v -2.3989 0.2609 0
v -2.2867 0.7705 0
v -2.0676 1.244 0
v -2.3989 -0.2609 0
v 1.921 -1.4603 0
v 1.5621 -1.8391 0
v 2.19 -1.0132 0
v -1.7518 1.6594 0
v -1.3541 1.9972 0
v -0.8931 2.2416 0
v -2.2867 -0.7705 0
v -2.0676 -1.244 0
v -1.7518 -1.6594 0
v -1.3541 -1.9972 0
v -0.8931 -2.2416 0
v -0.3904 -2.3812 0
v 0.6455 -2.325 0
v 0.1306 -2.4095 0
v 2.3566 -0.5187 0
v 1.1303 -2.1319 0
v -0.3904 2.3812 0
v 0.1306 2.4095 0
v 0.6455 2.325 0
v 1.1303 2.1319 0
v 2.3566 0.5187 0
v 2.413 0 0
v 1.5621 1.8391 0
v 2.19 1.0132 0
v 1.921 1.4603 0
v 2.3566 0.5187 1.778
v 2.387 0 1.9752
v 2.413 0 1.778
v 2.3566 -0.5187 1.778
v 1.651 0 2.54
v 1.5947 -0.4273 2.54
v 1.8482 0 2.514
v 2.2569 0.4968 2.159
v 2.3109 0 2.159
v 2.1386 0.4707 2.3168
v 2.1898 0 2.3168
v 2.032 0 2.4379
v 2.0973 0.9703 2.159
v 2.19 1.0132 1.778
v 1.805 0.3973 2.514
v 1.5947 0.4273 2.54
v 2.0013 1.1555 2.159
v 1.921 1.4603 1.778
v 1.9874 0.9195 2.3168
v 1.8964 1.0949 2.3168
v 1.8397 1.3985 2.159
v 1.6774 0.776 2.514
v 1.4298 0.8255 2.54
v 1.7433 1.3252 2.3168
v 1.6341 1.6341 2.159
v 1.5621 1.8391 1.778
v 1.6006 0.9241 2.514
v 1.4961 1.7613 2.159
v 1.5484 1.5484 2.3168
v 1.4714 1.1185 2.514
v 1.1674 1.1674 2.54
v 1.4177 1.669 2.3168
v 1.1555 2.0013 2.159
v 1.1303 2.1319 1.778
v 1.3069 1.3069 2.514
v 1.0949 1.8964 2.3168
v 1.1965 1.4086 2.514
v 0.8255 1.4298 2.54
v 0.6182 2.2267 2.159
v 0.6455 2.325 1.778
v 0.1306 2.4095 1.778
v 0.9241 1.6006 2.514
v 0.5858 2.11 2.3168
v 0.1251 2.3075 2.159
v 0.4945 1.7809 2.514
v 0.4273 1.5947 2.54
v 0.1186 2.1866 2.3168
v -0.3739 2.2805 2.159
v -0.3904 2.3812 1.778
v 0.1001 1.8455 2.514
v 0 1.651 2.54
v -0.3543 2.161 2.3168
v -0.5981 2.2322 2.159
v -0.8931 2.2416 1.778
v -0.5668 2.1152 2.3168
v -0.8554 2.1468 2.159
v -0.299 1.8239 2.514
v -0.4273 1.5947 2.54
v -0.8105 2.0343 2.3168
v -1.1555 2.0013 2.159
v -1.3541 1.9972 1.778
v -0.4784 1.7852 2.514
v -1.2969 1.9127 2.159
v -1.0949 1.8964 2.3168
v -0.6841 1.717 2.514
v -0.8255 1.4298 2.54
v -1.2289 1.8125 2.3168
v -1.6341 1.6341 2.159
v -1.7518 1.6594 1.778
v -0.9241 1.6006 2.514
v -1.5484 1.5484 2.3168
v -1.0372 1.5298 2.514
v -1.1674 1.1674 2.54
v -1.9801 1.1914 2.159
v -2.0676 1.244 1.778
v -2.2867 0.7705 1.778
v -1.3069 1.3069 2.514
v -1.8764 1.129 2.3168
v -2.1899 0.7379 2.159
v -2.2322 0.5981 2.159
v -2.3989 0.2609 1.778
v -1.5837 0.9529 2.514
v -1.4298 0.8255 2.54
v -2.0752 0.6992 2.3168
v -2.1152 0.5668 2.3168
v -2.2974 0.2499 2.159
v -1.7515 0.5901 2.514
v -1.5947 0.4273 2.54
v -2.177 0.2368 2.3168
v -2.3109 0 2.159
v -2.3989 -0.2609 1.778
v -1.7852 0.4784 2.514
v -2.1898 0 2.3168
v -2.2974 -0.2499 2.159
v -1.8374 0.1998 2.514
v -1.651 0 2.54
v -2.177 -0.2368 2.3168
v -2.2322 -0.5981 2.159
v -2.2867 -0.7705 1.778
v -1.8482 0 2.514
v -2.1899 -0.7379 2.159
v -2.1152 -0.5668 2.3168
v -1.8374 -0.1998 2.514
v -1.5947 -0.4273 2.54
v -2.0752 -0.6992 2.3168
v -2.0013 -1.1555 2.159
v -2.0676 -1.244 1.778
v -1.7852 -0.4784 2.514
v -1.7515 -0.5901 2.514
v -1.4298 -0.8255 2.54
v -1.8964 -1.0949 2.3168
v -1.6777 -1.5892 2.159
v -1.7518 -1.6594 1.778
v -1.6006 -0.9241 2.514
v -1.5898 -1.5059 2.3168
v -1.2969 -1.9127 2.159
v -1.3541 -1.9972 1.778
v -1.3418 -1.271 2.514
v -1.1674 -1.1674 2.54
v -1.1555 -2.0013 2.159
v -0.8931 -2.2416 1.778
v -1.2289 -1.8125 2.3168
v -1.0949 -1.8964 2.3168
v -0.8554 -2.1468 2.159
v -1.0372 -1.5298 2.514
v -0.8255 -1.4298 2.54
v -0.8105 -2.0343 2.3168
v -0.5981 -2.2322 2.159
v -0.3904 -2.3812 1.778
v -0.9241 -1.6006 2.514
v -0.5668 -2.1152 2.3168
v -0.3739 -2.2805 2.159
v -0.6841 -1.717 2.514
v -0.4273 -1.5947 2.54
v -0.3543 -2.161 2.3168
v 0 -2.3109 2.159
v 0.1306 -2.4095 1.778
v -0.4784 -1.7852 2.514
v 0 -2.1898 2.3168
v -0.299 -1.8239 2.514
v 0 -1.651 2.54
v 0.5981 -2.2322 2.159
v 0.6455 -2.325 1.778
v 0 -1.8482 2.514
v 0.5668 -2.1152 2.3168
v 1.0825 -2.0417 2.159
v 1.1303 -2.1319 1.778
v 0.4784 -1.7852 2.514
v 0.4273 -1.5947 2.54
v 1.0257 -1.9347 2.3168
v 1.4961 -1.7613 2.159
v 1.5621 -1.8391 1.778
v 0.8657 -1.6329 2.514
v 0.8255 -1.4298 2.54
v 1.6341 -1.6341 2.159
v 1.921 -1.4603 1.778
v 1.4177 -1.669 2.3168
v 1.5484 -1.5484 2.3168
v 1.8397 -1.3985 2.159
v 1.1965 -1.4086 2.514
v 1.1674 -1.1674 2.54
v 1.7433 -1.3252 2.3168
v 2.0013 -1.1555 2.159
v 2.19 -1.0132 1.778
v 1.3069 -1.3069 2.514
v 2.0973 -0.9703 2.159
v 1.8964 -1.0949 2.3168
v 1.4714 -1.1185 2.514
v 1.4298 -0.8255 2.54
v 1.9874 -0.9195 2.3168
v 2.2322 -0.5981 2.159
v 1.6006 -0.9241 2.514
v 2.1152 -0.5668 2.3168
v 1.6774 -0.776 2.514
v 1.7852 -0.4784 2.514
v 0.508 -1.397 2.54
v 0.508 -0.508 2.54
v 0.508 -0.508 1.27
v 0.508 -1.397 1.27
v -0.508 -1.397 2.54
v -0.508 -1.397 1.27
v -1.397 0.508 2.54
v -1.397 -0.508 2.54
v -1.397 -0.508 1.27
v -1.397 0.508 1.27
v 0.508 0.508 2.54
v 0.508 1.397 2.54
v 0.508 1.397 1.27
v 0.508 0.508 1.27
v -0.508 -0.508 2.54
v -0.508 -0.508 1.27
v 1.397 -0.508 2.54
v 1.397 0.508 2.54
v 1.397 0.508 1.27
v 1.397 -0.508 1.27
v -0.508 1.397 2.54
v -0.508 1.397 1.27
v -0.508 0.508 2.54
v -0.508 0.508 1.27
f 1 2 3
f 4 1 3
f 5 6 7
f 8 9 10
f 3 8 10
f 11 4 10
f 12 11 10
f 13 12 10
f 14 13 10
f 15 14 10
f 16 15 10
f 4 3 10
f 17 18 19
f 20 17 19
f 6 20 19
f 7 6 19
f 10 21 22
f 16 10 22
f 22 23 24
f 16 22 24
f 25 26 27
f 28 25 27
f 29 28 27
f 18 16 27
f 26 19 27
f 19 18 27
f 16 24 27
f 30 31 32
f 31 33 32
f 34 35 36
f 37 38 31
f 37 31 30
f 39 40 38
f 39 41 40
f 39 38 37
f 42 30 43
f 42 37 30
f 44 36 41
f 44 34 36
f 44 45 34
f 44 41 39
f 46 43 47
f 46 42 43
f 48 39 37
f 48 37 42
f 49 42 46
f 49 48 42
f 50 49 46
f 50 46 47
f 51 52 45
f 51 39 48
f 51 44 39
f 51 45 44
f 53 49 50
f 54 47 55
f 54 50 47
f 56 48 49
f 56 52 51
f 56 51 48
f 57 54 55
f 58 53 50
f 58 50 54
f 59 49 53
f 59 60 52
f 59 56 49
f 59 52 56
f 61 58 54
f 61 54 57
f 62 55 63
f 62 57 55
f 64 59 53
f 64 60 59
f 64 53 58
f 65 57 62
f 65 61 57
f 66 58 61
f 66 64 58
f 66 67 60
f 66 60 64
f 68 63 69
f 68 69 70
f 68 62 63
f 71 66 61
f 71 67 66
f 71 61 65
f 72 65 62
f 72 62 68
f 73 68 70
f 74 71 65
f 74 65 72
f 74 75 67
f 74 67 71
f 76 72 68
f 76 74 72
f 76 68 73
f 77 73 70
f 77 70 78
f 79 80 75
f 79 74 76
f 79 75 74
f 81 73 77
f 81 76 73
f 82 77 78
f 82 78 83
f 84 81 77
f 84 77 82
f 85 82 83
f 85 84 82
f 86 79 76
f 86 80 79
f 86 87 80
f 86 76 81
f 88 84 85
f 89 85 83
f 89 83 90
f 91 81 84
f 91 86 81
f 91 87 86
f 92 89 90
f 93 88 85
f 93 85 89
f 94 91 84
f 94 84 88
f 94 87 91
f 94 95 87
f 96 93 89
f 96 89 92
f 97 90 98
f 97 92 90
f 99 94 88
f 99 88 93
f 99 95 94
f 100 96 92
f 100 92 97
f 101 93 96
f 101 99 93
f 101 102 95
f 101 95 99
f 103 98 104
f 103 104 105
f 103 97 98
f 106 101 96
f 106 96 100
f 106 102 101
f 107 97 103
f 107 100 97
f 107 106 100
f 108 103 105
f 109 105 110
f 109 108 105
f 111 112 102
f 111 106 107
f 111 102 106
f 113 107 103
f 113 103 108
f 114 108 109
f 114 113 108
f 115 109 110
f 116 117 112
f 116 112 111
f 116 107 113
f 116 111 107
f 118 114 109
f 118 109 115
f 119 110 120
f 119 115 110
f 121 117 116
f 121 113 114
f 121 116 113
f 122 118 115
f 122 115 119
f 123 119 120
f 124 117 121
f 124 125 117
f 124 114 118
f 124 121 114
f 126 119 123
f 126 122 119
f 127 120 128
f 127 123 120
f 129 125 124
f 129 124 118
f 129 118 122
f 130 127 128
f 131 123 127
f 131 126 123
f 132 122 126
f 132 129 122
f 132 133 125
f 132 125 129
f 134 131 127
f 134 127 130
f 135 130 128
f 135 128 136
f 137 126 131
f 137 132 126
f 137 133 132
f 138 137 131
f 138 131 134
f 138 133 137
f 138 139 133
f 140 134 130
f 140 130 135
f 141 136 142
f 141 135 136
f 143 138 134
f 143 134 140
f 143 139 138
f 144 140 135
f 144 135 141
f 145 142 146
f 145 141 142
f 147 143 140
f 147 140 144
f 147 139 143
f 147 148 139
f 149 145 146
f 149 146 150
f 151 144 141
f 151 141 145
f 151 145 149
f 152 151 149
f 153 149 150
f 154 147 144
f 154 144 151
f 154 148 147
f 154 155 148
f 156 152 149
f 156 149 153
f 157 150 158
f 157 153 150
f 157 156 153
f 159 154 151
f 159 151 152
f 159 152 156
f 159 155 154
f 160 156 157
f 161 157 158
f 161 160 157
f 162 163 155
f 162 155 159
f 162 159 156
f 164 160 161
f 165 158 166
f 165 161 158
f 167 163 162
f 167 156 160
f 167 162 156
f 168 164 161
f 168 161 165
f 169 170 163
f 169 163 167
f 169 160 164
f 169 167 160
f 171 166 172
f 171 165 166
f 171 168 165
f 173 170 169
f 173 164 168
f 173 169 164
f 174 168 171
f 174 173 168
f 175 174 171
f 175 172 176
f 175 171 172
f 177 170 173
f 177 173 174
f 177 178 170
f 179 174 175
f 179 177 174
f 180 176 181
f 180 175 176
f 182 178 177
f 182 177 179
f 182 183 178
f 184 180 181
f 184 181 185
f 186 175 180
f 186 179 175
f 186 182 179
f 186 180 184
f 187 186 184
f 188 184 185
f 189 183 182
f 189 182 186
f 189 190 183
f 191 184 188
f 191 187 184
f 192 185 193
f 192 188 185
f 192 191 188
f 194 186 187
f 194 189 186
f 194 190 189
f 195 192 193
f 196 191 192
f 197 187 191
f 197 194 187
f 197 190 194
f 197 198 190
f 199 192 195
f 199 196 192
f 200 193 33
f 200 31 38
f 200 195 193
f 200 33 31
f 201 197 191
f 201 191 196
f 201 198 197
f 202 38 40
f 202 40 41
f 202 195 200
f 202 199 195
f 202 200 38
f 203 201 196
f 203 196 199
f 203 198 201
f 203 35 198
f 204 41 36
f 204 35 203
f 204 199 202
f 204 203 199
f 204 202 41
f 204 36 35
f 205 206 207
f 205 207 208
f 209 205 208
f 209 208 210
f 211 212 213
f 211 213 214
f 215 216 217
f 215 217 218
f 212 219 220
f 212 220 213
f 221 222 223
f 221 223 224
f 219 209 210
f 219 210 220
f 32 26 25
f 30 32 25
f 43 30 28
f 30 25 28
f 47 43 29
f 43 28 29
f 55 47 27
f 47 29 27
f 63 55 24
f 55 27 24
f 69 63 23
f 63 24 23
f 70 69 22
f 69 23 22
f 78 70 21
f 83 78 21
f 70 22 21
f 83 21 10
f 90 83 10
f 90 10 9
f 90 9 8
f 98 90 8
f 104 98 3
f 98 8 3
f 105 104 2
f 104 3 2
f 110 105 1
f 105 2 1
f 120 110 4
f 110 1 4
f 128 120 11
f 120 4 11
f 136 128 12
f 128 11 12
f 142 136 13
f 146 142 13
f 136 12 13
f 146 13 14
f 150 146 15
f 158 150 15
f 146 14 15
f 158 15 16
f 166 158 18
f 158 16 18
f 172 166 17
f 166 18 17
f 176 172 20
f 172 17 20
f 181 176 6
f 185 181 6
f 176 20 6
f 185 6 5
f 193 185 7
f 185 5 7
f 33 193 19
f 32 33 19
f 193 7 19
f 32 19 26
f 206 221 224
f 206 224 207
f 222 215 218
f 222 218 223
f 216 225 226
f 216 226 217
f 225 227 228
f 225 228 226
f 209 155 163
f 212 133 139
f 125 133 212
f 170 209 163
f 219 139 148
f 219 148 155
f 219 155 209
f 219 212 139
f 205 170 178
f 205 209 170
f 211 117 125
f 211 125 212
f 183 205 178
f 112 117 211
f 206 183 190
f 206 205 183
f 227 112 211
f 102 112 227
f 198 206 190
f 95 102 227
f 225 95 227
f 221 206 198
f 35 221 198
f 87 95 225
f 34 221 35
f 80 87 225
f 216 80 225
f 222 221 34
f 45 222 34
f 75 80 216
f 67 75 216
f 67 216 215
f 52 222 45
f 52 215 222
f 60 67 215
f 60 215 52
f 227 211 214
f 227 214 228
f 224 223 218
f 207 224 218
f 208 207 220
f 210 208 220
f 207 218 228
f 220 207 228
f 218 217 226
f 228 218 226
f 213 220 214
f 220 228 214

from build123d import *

# Parameters (mm, degrees)
SKETCH1_R           = 2.413
BOSS_EXTRUDE1_DEPTH = 2.54
CUT_EXTRUDE1_DEPTH  = 1.27
FILLET1_R           = 0.762


with BuildPart() as part:
    # Sketch1 → Boss-Extrude1 (new body)
    with BuildSketch(Plane.XY):
        Circle(SKETCH1_R)
    extrude(amount=BOSS_EXTRUDE1_DEPTH)

    # Sketch2 → Cut-Extrude1 (cut)
    with BuildSketch(Plane.XY.offset(2.54)):
        Polygon((-0.508, 0.508), (-0.508, 1.397), (0.508, 1.397), (0.508, 0.508), (1.397, 0.508), (1.397, -0.508), (0.508, -0.508), (0.508, -1.397), (-0.508, -1.397), (-0.508, -0.508), (-1.397, -0.508), (-1.397, 0.508), align=None)
    extrude(amount=-CUT_EXTRUDE1_DEPTH, mode=Mode.SUBTRACT)

    # Fillet1
    fillet1_edges = [part.edges().sort_by_distance(p)[0] for p in [
        (-2.413, 0, 2.54),
    ]]
    fillet(fillet1_edges, radius=FILLET1_R)


solid = part.part
